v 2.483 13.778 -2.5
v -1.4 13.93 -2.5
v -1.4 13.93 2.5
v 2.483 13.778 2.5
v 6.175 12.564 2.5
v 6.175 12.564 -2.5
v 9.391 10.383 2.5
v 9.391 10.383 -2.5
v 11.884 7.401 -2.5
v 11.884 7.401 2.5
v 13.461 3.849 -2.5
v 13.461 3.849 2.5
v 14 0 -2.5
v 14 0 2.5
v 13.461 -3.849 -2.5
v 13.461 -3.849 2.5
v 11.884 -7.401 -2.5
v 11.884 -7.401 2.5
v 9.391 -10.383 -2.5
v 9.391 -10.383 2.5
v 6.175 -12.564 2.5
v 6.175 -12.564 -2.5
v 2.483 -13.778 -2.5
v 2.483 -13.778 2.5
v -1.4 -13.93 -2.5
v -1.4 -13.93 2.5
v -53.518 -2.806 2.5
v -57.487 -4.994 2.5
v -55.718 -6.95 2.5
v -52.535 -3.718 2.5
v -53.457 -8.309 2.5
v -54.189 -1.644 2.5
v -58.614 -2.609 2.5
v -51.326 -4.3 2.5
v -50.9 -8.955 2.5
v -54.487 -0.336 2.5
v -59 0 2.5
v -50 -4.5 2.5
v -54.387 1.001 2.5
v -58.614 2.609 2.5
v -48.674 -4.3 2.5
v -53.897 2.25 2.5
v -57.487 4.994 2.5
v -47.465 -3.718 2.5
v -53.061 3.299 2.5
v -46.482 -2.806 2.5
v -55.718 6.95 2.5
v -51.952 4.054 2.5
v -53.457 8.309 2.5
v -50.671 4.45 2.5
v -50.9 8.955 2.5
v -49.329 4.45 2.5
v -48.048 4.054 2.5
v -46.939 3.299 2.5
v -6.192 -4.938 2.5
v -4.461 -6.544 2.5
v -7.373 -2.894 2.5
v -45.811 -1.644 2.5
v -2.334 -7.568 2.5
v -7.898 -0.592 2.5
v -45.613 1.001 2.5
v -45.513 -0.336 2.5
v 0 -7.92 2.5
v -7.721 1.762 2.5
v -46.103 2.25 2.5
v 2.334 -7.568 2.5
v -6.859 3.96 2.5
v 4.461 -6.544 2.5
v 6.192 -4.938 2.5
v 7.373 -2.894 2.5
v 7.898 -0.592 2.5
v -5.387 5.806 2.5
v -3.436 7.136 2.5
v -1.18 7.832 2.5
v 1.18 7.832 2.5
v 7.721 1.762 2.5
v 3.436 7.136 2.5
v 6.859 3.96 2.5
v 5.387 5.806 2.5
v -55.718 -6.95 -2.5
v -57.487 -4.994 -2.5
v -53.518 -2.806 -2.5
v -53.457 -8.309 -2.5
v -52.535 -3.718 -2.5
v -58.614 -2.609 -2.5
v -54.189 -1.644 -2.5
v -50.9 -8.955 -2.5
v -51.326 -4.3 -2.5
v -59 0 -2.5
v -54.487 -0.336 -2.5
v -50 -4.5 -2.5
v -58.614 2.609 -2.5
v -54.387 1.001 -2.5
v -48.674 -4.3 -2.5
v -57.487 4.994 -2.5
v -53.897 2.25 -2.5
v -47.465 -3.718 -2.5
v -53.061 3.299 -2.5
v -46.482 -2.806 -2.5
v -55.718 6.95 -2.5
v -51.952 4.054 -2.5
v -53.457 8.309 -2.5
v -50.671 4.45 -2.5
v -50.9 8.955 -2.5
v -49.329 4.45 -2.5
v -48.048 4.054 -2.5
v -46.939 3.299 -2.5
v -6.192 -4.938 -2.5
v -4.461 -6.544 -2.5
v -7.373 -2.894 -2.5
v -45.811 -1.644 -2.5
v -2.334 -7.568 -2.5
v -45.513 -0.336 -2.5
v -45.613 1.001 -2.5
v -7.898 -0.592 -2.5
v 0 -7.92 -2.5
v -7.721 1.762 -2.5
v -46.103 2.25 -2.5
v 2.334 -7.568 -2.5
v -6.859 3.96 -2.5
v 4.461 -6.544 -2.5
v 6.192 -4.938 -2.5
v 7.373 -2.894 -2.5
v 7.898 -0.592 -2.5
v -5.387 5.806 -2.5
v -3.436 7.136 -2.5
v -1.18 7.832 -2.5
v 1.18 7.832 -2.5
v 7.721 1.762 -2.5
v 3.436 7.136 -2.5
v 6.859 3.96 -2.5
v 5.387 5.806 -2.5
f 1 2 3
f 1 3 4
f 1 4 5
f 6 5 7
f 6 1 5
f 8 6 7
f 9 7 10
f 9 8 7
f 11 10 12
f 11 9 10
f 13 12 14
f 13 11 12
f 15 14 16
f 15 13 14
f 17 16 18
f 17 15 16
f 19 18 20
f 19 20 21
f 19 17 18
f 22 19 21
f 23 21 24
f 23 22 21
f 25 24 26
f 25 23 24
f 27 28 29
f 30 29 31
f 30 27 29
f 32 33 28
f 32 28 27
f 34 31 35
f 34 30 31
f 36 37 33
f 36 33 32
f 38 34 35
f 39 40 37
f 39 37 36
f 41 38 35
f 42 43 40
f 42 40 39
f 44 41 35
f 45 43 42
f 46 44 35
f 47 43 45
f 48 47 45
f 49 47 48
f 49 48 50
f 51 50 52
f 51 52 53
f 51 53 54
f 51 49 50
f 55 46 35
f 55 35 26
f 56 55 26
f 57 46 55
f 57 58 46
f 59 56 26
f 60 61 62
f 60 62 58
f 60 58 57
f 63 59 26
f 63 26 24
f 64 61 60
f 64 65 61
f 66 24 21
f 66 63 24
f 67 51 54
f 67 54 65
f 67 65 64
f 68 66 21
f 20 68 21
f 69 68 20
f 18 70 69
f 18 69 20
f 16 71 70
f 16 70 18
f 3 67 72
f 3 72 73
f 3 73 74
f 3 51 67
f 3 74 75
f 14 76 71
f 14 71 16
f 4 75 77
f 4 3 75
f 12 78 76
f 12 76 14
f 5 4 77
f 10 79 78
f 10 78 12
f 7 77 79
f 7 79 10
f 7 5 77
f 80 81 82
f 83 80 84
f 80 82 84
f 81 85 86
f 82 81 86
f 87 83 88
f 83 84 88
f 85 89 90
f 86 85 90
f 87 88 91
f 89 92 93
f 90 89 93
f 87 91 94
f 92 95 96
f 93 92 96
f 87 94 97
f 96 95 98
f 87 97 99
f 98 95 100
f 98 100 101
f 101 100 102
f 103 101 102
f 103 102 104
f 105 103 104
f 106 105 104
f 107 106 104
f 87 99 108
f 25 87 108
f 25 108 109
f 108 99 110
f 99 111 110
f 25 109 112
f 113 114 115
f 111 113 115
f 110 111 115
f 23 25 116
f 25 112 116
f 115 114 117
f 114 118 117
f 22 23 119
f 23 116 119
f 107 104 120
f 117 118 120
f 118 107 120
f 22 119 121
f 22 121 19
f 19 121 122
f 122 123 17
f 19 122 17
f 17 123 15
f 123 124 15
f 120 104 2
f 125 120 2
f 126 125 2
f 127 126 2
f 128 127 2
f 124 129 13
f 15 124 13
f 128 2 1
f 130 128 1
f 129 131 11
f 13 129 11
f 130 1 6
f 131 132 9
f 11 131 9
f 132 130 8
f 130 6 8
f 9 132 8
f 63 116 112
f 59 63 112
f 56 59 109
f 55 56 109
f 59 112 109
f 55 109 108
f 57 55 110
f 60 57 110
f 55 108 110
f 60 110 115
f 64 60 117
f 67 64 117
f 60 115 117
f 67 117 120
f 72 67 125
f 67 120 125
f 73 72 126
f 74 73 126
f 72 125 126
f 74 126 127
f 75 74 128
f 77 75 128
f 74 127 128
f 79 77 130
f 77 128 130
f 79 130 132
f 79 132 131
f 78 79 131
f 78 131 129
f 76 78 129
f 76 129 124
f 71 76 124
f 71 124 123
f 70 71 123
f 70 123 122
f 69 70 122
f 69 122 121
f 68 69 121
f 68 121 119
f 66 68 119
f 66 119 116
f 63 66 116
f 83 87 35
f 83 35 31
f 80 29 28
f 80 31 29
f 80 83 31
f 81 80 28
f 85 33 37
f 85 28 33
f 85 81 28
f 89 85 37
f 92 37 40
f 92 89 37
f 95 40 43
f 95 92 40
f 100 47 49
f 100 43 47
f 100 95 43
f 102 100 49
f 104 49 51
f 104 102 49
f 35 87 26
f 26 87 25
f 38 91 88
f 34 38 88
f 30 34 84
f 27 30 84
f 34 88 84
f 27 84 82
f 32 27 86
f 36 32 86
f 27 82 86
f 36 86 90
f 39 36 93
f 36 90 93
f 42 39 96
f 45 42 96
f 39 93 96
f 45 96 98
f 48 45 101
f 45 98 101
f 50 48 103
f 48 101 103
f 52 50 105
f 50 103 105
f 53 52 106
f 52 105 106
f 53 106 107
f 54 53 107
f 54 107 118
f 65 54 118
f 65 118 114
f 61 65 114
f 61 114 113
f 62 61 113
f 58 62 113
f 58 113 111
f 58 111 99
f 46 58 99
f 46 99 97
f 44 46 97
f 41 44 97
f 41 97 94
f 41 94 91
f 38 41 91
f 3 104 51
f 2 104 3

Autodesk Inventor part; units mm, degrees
ref_plane "YZ Plane" through (0, 0, 0) normal (1, 0, 0) x (0, 1, 0)
ref_plane "XZ Plane" through (0, 0, 0) normal (0, 1, 0) x (-1, 0, 0)
sketch "Sketch1" plane through (0, 0, 0) normal (0, 0, 1) x (1, 0, 0)
  circle A0 centre (0, 0) radius 14
  line L0 (0, 0) -> (-50, 0) construction
  circle A1 centre (-50, 0) radius 9
  line L1 (-50.9, 8.9549) -> (-1.4, 13.9298)
  line L2 (-50.9, -8.9549) -> (-1.4, -13.9298)
  point P0 (0, 0)
  dimension "d0" = 18
  dimension "d1" = 28
  dimension "d2" = 50
extrude "Extrusion1" add sketch "Sketch1" along normal mid plane 5
sketch "Sketch2" plane through (0, 0, 2.5) normal (0, 0, 1) x (1, 0, 0)
  arc A0 (-1.4, -13.9298) -> (-1.4, 13.9298) centre (0, 0) ccw projected
hole "Hole1" at (0, 0, 2.5) direction (0, 0, -1) diameter 15.84 end through all
sketch "Sketch3" plane through (0, 0, 2.5) normal (0, 0, 1) x (1, 0, 0)
  arc A0 (-50.9, 8.9549) -> (-50.9, -8.9549) centre (-50, 0) ccw projected
hole "Hole2" at (-50, 0, 2.5) direction (0, 0, -1) diameter 9 end through all
properties part number "201-01" material "Steel"
